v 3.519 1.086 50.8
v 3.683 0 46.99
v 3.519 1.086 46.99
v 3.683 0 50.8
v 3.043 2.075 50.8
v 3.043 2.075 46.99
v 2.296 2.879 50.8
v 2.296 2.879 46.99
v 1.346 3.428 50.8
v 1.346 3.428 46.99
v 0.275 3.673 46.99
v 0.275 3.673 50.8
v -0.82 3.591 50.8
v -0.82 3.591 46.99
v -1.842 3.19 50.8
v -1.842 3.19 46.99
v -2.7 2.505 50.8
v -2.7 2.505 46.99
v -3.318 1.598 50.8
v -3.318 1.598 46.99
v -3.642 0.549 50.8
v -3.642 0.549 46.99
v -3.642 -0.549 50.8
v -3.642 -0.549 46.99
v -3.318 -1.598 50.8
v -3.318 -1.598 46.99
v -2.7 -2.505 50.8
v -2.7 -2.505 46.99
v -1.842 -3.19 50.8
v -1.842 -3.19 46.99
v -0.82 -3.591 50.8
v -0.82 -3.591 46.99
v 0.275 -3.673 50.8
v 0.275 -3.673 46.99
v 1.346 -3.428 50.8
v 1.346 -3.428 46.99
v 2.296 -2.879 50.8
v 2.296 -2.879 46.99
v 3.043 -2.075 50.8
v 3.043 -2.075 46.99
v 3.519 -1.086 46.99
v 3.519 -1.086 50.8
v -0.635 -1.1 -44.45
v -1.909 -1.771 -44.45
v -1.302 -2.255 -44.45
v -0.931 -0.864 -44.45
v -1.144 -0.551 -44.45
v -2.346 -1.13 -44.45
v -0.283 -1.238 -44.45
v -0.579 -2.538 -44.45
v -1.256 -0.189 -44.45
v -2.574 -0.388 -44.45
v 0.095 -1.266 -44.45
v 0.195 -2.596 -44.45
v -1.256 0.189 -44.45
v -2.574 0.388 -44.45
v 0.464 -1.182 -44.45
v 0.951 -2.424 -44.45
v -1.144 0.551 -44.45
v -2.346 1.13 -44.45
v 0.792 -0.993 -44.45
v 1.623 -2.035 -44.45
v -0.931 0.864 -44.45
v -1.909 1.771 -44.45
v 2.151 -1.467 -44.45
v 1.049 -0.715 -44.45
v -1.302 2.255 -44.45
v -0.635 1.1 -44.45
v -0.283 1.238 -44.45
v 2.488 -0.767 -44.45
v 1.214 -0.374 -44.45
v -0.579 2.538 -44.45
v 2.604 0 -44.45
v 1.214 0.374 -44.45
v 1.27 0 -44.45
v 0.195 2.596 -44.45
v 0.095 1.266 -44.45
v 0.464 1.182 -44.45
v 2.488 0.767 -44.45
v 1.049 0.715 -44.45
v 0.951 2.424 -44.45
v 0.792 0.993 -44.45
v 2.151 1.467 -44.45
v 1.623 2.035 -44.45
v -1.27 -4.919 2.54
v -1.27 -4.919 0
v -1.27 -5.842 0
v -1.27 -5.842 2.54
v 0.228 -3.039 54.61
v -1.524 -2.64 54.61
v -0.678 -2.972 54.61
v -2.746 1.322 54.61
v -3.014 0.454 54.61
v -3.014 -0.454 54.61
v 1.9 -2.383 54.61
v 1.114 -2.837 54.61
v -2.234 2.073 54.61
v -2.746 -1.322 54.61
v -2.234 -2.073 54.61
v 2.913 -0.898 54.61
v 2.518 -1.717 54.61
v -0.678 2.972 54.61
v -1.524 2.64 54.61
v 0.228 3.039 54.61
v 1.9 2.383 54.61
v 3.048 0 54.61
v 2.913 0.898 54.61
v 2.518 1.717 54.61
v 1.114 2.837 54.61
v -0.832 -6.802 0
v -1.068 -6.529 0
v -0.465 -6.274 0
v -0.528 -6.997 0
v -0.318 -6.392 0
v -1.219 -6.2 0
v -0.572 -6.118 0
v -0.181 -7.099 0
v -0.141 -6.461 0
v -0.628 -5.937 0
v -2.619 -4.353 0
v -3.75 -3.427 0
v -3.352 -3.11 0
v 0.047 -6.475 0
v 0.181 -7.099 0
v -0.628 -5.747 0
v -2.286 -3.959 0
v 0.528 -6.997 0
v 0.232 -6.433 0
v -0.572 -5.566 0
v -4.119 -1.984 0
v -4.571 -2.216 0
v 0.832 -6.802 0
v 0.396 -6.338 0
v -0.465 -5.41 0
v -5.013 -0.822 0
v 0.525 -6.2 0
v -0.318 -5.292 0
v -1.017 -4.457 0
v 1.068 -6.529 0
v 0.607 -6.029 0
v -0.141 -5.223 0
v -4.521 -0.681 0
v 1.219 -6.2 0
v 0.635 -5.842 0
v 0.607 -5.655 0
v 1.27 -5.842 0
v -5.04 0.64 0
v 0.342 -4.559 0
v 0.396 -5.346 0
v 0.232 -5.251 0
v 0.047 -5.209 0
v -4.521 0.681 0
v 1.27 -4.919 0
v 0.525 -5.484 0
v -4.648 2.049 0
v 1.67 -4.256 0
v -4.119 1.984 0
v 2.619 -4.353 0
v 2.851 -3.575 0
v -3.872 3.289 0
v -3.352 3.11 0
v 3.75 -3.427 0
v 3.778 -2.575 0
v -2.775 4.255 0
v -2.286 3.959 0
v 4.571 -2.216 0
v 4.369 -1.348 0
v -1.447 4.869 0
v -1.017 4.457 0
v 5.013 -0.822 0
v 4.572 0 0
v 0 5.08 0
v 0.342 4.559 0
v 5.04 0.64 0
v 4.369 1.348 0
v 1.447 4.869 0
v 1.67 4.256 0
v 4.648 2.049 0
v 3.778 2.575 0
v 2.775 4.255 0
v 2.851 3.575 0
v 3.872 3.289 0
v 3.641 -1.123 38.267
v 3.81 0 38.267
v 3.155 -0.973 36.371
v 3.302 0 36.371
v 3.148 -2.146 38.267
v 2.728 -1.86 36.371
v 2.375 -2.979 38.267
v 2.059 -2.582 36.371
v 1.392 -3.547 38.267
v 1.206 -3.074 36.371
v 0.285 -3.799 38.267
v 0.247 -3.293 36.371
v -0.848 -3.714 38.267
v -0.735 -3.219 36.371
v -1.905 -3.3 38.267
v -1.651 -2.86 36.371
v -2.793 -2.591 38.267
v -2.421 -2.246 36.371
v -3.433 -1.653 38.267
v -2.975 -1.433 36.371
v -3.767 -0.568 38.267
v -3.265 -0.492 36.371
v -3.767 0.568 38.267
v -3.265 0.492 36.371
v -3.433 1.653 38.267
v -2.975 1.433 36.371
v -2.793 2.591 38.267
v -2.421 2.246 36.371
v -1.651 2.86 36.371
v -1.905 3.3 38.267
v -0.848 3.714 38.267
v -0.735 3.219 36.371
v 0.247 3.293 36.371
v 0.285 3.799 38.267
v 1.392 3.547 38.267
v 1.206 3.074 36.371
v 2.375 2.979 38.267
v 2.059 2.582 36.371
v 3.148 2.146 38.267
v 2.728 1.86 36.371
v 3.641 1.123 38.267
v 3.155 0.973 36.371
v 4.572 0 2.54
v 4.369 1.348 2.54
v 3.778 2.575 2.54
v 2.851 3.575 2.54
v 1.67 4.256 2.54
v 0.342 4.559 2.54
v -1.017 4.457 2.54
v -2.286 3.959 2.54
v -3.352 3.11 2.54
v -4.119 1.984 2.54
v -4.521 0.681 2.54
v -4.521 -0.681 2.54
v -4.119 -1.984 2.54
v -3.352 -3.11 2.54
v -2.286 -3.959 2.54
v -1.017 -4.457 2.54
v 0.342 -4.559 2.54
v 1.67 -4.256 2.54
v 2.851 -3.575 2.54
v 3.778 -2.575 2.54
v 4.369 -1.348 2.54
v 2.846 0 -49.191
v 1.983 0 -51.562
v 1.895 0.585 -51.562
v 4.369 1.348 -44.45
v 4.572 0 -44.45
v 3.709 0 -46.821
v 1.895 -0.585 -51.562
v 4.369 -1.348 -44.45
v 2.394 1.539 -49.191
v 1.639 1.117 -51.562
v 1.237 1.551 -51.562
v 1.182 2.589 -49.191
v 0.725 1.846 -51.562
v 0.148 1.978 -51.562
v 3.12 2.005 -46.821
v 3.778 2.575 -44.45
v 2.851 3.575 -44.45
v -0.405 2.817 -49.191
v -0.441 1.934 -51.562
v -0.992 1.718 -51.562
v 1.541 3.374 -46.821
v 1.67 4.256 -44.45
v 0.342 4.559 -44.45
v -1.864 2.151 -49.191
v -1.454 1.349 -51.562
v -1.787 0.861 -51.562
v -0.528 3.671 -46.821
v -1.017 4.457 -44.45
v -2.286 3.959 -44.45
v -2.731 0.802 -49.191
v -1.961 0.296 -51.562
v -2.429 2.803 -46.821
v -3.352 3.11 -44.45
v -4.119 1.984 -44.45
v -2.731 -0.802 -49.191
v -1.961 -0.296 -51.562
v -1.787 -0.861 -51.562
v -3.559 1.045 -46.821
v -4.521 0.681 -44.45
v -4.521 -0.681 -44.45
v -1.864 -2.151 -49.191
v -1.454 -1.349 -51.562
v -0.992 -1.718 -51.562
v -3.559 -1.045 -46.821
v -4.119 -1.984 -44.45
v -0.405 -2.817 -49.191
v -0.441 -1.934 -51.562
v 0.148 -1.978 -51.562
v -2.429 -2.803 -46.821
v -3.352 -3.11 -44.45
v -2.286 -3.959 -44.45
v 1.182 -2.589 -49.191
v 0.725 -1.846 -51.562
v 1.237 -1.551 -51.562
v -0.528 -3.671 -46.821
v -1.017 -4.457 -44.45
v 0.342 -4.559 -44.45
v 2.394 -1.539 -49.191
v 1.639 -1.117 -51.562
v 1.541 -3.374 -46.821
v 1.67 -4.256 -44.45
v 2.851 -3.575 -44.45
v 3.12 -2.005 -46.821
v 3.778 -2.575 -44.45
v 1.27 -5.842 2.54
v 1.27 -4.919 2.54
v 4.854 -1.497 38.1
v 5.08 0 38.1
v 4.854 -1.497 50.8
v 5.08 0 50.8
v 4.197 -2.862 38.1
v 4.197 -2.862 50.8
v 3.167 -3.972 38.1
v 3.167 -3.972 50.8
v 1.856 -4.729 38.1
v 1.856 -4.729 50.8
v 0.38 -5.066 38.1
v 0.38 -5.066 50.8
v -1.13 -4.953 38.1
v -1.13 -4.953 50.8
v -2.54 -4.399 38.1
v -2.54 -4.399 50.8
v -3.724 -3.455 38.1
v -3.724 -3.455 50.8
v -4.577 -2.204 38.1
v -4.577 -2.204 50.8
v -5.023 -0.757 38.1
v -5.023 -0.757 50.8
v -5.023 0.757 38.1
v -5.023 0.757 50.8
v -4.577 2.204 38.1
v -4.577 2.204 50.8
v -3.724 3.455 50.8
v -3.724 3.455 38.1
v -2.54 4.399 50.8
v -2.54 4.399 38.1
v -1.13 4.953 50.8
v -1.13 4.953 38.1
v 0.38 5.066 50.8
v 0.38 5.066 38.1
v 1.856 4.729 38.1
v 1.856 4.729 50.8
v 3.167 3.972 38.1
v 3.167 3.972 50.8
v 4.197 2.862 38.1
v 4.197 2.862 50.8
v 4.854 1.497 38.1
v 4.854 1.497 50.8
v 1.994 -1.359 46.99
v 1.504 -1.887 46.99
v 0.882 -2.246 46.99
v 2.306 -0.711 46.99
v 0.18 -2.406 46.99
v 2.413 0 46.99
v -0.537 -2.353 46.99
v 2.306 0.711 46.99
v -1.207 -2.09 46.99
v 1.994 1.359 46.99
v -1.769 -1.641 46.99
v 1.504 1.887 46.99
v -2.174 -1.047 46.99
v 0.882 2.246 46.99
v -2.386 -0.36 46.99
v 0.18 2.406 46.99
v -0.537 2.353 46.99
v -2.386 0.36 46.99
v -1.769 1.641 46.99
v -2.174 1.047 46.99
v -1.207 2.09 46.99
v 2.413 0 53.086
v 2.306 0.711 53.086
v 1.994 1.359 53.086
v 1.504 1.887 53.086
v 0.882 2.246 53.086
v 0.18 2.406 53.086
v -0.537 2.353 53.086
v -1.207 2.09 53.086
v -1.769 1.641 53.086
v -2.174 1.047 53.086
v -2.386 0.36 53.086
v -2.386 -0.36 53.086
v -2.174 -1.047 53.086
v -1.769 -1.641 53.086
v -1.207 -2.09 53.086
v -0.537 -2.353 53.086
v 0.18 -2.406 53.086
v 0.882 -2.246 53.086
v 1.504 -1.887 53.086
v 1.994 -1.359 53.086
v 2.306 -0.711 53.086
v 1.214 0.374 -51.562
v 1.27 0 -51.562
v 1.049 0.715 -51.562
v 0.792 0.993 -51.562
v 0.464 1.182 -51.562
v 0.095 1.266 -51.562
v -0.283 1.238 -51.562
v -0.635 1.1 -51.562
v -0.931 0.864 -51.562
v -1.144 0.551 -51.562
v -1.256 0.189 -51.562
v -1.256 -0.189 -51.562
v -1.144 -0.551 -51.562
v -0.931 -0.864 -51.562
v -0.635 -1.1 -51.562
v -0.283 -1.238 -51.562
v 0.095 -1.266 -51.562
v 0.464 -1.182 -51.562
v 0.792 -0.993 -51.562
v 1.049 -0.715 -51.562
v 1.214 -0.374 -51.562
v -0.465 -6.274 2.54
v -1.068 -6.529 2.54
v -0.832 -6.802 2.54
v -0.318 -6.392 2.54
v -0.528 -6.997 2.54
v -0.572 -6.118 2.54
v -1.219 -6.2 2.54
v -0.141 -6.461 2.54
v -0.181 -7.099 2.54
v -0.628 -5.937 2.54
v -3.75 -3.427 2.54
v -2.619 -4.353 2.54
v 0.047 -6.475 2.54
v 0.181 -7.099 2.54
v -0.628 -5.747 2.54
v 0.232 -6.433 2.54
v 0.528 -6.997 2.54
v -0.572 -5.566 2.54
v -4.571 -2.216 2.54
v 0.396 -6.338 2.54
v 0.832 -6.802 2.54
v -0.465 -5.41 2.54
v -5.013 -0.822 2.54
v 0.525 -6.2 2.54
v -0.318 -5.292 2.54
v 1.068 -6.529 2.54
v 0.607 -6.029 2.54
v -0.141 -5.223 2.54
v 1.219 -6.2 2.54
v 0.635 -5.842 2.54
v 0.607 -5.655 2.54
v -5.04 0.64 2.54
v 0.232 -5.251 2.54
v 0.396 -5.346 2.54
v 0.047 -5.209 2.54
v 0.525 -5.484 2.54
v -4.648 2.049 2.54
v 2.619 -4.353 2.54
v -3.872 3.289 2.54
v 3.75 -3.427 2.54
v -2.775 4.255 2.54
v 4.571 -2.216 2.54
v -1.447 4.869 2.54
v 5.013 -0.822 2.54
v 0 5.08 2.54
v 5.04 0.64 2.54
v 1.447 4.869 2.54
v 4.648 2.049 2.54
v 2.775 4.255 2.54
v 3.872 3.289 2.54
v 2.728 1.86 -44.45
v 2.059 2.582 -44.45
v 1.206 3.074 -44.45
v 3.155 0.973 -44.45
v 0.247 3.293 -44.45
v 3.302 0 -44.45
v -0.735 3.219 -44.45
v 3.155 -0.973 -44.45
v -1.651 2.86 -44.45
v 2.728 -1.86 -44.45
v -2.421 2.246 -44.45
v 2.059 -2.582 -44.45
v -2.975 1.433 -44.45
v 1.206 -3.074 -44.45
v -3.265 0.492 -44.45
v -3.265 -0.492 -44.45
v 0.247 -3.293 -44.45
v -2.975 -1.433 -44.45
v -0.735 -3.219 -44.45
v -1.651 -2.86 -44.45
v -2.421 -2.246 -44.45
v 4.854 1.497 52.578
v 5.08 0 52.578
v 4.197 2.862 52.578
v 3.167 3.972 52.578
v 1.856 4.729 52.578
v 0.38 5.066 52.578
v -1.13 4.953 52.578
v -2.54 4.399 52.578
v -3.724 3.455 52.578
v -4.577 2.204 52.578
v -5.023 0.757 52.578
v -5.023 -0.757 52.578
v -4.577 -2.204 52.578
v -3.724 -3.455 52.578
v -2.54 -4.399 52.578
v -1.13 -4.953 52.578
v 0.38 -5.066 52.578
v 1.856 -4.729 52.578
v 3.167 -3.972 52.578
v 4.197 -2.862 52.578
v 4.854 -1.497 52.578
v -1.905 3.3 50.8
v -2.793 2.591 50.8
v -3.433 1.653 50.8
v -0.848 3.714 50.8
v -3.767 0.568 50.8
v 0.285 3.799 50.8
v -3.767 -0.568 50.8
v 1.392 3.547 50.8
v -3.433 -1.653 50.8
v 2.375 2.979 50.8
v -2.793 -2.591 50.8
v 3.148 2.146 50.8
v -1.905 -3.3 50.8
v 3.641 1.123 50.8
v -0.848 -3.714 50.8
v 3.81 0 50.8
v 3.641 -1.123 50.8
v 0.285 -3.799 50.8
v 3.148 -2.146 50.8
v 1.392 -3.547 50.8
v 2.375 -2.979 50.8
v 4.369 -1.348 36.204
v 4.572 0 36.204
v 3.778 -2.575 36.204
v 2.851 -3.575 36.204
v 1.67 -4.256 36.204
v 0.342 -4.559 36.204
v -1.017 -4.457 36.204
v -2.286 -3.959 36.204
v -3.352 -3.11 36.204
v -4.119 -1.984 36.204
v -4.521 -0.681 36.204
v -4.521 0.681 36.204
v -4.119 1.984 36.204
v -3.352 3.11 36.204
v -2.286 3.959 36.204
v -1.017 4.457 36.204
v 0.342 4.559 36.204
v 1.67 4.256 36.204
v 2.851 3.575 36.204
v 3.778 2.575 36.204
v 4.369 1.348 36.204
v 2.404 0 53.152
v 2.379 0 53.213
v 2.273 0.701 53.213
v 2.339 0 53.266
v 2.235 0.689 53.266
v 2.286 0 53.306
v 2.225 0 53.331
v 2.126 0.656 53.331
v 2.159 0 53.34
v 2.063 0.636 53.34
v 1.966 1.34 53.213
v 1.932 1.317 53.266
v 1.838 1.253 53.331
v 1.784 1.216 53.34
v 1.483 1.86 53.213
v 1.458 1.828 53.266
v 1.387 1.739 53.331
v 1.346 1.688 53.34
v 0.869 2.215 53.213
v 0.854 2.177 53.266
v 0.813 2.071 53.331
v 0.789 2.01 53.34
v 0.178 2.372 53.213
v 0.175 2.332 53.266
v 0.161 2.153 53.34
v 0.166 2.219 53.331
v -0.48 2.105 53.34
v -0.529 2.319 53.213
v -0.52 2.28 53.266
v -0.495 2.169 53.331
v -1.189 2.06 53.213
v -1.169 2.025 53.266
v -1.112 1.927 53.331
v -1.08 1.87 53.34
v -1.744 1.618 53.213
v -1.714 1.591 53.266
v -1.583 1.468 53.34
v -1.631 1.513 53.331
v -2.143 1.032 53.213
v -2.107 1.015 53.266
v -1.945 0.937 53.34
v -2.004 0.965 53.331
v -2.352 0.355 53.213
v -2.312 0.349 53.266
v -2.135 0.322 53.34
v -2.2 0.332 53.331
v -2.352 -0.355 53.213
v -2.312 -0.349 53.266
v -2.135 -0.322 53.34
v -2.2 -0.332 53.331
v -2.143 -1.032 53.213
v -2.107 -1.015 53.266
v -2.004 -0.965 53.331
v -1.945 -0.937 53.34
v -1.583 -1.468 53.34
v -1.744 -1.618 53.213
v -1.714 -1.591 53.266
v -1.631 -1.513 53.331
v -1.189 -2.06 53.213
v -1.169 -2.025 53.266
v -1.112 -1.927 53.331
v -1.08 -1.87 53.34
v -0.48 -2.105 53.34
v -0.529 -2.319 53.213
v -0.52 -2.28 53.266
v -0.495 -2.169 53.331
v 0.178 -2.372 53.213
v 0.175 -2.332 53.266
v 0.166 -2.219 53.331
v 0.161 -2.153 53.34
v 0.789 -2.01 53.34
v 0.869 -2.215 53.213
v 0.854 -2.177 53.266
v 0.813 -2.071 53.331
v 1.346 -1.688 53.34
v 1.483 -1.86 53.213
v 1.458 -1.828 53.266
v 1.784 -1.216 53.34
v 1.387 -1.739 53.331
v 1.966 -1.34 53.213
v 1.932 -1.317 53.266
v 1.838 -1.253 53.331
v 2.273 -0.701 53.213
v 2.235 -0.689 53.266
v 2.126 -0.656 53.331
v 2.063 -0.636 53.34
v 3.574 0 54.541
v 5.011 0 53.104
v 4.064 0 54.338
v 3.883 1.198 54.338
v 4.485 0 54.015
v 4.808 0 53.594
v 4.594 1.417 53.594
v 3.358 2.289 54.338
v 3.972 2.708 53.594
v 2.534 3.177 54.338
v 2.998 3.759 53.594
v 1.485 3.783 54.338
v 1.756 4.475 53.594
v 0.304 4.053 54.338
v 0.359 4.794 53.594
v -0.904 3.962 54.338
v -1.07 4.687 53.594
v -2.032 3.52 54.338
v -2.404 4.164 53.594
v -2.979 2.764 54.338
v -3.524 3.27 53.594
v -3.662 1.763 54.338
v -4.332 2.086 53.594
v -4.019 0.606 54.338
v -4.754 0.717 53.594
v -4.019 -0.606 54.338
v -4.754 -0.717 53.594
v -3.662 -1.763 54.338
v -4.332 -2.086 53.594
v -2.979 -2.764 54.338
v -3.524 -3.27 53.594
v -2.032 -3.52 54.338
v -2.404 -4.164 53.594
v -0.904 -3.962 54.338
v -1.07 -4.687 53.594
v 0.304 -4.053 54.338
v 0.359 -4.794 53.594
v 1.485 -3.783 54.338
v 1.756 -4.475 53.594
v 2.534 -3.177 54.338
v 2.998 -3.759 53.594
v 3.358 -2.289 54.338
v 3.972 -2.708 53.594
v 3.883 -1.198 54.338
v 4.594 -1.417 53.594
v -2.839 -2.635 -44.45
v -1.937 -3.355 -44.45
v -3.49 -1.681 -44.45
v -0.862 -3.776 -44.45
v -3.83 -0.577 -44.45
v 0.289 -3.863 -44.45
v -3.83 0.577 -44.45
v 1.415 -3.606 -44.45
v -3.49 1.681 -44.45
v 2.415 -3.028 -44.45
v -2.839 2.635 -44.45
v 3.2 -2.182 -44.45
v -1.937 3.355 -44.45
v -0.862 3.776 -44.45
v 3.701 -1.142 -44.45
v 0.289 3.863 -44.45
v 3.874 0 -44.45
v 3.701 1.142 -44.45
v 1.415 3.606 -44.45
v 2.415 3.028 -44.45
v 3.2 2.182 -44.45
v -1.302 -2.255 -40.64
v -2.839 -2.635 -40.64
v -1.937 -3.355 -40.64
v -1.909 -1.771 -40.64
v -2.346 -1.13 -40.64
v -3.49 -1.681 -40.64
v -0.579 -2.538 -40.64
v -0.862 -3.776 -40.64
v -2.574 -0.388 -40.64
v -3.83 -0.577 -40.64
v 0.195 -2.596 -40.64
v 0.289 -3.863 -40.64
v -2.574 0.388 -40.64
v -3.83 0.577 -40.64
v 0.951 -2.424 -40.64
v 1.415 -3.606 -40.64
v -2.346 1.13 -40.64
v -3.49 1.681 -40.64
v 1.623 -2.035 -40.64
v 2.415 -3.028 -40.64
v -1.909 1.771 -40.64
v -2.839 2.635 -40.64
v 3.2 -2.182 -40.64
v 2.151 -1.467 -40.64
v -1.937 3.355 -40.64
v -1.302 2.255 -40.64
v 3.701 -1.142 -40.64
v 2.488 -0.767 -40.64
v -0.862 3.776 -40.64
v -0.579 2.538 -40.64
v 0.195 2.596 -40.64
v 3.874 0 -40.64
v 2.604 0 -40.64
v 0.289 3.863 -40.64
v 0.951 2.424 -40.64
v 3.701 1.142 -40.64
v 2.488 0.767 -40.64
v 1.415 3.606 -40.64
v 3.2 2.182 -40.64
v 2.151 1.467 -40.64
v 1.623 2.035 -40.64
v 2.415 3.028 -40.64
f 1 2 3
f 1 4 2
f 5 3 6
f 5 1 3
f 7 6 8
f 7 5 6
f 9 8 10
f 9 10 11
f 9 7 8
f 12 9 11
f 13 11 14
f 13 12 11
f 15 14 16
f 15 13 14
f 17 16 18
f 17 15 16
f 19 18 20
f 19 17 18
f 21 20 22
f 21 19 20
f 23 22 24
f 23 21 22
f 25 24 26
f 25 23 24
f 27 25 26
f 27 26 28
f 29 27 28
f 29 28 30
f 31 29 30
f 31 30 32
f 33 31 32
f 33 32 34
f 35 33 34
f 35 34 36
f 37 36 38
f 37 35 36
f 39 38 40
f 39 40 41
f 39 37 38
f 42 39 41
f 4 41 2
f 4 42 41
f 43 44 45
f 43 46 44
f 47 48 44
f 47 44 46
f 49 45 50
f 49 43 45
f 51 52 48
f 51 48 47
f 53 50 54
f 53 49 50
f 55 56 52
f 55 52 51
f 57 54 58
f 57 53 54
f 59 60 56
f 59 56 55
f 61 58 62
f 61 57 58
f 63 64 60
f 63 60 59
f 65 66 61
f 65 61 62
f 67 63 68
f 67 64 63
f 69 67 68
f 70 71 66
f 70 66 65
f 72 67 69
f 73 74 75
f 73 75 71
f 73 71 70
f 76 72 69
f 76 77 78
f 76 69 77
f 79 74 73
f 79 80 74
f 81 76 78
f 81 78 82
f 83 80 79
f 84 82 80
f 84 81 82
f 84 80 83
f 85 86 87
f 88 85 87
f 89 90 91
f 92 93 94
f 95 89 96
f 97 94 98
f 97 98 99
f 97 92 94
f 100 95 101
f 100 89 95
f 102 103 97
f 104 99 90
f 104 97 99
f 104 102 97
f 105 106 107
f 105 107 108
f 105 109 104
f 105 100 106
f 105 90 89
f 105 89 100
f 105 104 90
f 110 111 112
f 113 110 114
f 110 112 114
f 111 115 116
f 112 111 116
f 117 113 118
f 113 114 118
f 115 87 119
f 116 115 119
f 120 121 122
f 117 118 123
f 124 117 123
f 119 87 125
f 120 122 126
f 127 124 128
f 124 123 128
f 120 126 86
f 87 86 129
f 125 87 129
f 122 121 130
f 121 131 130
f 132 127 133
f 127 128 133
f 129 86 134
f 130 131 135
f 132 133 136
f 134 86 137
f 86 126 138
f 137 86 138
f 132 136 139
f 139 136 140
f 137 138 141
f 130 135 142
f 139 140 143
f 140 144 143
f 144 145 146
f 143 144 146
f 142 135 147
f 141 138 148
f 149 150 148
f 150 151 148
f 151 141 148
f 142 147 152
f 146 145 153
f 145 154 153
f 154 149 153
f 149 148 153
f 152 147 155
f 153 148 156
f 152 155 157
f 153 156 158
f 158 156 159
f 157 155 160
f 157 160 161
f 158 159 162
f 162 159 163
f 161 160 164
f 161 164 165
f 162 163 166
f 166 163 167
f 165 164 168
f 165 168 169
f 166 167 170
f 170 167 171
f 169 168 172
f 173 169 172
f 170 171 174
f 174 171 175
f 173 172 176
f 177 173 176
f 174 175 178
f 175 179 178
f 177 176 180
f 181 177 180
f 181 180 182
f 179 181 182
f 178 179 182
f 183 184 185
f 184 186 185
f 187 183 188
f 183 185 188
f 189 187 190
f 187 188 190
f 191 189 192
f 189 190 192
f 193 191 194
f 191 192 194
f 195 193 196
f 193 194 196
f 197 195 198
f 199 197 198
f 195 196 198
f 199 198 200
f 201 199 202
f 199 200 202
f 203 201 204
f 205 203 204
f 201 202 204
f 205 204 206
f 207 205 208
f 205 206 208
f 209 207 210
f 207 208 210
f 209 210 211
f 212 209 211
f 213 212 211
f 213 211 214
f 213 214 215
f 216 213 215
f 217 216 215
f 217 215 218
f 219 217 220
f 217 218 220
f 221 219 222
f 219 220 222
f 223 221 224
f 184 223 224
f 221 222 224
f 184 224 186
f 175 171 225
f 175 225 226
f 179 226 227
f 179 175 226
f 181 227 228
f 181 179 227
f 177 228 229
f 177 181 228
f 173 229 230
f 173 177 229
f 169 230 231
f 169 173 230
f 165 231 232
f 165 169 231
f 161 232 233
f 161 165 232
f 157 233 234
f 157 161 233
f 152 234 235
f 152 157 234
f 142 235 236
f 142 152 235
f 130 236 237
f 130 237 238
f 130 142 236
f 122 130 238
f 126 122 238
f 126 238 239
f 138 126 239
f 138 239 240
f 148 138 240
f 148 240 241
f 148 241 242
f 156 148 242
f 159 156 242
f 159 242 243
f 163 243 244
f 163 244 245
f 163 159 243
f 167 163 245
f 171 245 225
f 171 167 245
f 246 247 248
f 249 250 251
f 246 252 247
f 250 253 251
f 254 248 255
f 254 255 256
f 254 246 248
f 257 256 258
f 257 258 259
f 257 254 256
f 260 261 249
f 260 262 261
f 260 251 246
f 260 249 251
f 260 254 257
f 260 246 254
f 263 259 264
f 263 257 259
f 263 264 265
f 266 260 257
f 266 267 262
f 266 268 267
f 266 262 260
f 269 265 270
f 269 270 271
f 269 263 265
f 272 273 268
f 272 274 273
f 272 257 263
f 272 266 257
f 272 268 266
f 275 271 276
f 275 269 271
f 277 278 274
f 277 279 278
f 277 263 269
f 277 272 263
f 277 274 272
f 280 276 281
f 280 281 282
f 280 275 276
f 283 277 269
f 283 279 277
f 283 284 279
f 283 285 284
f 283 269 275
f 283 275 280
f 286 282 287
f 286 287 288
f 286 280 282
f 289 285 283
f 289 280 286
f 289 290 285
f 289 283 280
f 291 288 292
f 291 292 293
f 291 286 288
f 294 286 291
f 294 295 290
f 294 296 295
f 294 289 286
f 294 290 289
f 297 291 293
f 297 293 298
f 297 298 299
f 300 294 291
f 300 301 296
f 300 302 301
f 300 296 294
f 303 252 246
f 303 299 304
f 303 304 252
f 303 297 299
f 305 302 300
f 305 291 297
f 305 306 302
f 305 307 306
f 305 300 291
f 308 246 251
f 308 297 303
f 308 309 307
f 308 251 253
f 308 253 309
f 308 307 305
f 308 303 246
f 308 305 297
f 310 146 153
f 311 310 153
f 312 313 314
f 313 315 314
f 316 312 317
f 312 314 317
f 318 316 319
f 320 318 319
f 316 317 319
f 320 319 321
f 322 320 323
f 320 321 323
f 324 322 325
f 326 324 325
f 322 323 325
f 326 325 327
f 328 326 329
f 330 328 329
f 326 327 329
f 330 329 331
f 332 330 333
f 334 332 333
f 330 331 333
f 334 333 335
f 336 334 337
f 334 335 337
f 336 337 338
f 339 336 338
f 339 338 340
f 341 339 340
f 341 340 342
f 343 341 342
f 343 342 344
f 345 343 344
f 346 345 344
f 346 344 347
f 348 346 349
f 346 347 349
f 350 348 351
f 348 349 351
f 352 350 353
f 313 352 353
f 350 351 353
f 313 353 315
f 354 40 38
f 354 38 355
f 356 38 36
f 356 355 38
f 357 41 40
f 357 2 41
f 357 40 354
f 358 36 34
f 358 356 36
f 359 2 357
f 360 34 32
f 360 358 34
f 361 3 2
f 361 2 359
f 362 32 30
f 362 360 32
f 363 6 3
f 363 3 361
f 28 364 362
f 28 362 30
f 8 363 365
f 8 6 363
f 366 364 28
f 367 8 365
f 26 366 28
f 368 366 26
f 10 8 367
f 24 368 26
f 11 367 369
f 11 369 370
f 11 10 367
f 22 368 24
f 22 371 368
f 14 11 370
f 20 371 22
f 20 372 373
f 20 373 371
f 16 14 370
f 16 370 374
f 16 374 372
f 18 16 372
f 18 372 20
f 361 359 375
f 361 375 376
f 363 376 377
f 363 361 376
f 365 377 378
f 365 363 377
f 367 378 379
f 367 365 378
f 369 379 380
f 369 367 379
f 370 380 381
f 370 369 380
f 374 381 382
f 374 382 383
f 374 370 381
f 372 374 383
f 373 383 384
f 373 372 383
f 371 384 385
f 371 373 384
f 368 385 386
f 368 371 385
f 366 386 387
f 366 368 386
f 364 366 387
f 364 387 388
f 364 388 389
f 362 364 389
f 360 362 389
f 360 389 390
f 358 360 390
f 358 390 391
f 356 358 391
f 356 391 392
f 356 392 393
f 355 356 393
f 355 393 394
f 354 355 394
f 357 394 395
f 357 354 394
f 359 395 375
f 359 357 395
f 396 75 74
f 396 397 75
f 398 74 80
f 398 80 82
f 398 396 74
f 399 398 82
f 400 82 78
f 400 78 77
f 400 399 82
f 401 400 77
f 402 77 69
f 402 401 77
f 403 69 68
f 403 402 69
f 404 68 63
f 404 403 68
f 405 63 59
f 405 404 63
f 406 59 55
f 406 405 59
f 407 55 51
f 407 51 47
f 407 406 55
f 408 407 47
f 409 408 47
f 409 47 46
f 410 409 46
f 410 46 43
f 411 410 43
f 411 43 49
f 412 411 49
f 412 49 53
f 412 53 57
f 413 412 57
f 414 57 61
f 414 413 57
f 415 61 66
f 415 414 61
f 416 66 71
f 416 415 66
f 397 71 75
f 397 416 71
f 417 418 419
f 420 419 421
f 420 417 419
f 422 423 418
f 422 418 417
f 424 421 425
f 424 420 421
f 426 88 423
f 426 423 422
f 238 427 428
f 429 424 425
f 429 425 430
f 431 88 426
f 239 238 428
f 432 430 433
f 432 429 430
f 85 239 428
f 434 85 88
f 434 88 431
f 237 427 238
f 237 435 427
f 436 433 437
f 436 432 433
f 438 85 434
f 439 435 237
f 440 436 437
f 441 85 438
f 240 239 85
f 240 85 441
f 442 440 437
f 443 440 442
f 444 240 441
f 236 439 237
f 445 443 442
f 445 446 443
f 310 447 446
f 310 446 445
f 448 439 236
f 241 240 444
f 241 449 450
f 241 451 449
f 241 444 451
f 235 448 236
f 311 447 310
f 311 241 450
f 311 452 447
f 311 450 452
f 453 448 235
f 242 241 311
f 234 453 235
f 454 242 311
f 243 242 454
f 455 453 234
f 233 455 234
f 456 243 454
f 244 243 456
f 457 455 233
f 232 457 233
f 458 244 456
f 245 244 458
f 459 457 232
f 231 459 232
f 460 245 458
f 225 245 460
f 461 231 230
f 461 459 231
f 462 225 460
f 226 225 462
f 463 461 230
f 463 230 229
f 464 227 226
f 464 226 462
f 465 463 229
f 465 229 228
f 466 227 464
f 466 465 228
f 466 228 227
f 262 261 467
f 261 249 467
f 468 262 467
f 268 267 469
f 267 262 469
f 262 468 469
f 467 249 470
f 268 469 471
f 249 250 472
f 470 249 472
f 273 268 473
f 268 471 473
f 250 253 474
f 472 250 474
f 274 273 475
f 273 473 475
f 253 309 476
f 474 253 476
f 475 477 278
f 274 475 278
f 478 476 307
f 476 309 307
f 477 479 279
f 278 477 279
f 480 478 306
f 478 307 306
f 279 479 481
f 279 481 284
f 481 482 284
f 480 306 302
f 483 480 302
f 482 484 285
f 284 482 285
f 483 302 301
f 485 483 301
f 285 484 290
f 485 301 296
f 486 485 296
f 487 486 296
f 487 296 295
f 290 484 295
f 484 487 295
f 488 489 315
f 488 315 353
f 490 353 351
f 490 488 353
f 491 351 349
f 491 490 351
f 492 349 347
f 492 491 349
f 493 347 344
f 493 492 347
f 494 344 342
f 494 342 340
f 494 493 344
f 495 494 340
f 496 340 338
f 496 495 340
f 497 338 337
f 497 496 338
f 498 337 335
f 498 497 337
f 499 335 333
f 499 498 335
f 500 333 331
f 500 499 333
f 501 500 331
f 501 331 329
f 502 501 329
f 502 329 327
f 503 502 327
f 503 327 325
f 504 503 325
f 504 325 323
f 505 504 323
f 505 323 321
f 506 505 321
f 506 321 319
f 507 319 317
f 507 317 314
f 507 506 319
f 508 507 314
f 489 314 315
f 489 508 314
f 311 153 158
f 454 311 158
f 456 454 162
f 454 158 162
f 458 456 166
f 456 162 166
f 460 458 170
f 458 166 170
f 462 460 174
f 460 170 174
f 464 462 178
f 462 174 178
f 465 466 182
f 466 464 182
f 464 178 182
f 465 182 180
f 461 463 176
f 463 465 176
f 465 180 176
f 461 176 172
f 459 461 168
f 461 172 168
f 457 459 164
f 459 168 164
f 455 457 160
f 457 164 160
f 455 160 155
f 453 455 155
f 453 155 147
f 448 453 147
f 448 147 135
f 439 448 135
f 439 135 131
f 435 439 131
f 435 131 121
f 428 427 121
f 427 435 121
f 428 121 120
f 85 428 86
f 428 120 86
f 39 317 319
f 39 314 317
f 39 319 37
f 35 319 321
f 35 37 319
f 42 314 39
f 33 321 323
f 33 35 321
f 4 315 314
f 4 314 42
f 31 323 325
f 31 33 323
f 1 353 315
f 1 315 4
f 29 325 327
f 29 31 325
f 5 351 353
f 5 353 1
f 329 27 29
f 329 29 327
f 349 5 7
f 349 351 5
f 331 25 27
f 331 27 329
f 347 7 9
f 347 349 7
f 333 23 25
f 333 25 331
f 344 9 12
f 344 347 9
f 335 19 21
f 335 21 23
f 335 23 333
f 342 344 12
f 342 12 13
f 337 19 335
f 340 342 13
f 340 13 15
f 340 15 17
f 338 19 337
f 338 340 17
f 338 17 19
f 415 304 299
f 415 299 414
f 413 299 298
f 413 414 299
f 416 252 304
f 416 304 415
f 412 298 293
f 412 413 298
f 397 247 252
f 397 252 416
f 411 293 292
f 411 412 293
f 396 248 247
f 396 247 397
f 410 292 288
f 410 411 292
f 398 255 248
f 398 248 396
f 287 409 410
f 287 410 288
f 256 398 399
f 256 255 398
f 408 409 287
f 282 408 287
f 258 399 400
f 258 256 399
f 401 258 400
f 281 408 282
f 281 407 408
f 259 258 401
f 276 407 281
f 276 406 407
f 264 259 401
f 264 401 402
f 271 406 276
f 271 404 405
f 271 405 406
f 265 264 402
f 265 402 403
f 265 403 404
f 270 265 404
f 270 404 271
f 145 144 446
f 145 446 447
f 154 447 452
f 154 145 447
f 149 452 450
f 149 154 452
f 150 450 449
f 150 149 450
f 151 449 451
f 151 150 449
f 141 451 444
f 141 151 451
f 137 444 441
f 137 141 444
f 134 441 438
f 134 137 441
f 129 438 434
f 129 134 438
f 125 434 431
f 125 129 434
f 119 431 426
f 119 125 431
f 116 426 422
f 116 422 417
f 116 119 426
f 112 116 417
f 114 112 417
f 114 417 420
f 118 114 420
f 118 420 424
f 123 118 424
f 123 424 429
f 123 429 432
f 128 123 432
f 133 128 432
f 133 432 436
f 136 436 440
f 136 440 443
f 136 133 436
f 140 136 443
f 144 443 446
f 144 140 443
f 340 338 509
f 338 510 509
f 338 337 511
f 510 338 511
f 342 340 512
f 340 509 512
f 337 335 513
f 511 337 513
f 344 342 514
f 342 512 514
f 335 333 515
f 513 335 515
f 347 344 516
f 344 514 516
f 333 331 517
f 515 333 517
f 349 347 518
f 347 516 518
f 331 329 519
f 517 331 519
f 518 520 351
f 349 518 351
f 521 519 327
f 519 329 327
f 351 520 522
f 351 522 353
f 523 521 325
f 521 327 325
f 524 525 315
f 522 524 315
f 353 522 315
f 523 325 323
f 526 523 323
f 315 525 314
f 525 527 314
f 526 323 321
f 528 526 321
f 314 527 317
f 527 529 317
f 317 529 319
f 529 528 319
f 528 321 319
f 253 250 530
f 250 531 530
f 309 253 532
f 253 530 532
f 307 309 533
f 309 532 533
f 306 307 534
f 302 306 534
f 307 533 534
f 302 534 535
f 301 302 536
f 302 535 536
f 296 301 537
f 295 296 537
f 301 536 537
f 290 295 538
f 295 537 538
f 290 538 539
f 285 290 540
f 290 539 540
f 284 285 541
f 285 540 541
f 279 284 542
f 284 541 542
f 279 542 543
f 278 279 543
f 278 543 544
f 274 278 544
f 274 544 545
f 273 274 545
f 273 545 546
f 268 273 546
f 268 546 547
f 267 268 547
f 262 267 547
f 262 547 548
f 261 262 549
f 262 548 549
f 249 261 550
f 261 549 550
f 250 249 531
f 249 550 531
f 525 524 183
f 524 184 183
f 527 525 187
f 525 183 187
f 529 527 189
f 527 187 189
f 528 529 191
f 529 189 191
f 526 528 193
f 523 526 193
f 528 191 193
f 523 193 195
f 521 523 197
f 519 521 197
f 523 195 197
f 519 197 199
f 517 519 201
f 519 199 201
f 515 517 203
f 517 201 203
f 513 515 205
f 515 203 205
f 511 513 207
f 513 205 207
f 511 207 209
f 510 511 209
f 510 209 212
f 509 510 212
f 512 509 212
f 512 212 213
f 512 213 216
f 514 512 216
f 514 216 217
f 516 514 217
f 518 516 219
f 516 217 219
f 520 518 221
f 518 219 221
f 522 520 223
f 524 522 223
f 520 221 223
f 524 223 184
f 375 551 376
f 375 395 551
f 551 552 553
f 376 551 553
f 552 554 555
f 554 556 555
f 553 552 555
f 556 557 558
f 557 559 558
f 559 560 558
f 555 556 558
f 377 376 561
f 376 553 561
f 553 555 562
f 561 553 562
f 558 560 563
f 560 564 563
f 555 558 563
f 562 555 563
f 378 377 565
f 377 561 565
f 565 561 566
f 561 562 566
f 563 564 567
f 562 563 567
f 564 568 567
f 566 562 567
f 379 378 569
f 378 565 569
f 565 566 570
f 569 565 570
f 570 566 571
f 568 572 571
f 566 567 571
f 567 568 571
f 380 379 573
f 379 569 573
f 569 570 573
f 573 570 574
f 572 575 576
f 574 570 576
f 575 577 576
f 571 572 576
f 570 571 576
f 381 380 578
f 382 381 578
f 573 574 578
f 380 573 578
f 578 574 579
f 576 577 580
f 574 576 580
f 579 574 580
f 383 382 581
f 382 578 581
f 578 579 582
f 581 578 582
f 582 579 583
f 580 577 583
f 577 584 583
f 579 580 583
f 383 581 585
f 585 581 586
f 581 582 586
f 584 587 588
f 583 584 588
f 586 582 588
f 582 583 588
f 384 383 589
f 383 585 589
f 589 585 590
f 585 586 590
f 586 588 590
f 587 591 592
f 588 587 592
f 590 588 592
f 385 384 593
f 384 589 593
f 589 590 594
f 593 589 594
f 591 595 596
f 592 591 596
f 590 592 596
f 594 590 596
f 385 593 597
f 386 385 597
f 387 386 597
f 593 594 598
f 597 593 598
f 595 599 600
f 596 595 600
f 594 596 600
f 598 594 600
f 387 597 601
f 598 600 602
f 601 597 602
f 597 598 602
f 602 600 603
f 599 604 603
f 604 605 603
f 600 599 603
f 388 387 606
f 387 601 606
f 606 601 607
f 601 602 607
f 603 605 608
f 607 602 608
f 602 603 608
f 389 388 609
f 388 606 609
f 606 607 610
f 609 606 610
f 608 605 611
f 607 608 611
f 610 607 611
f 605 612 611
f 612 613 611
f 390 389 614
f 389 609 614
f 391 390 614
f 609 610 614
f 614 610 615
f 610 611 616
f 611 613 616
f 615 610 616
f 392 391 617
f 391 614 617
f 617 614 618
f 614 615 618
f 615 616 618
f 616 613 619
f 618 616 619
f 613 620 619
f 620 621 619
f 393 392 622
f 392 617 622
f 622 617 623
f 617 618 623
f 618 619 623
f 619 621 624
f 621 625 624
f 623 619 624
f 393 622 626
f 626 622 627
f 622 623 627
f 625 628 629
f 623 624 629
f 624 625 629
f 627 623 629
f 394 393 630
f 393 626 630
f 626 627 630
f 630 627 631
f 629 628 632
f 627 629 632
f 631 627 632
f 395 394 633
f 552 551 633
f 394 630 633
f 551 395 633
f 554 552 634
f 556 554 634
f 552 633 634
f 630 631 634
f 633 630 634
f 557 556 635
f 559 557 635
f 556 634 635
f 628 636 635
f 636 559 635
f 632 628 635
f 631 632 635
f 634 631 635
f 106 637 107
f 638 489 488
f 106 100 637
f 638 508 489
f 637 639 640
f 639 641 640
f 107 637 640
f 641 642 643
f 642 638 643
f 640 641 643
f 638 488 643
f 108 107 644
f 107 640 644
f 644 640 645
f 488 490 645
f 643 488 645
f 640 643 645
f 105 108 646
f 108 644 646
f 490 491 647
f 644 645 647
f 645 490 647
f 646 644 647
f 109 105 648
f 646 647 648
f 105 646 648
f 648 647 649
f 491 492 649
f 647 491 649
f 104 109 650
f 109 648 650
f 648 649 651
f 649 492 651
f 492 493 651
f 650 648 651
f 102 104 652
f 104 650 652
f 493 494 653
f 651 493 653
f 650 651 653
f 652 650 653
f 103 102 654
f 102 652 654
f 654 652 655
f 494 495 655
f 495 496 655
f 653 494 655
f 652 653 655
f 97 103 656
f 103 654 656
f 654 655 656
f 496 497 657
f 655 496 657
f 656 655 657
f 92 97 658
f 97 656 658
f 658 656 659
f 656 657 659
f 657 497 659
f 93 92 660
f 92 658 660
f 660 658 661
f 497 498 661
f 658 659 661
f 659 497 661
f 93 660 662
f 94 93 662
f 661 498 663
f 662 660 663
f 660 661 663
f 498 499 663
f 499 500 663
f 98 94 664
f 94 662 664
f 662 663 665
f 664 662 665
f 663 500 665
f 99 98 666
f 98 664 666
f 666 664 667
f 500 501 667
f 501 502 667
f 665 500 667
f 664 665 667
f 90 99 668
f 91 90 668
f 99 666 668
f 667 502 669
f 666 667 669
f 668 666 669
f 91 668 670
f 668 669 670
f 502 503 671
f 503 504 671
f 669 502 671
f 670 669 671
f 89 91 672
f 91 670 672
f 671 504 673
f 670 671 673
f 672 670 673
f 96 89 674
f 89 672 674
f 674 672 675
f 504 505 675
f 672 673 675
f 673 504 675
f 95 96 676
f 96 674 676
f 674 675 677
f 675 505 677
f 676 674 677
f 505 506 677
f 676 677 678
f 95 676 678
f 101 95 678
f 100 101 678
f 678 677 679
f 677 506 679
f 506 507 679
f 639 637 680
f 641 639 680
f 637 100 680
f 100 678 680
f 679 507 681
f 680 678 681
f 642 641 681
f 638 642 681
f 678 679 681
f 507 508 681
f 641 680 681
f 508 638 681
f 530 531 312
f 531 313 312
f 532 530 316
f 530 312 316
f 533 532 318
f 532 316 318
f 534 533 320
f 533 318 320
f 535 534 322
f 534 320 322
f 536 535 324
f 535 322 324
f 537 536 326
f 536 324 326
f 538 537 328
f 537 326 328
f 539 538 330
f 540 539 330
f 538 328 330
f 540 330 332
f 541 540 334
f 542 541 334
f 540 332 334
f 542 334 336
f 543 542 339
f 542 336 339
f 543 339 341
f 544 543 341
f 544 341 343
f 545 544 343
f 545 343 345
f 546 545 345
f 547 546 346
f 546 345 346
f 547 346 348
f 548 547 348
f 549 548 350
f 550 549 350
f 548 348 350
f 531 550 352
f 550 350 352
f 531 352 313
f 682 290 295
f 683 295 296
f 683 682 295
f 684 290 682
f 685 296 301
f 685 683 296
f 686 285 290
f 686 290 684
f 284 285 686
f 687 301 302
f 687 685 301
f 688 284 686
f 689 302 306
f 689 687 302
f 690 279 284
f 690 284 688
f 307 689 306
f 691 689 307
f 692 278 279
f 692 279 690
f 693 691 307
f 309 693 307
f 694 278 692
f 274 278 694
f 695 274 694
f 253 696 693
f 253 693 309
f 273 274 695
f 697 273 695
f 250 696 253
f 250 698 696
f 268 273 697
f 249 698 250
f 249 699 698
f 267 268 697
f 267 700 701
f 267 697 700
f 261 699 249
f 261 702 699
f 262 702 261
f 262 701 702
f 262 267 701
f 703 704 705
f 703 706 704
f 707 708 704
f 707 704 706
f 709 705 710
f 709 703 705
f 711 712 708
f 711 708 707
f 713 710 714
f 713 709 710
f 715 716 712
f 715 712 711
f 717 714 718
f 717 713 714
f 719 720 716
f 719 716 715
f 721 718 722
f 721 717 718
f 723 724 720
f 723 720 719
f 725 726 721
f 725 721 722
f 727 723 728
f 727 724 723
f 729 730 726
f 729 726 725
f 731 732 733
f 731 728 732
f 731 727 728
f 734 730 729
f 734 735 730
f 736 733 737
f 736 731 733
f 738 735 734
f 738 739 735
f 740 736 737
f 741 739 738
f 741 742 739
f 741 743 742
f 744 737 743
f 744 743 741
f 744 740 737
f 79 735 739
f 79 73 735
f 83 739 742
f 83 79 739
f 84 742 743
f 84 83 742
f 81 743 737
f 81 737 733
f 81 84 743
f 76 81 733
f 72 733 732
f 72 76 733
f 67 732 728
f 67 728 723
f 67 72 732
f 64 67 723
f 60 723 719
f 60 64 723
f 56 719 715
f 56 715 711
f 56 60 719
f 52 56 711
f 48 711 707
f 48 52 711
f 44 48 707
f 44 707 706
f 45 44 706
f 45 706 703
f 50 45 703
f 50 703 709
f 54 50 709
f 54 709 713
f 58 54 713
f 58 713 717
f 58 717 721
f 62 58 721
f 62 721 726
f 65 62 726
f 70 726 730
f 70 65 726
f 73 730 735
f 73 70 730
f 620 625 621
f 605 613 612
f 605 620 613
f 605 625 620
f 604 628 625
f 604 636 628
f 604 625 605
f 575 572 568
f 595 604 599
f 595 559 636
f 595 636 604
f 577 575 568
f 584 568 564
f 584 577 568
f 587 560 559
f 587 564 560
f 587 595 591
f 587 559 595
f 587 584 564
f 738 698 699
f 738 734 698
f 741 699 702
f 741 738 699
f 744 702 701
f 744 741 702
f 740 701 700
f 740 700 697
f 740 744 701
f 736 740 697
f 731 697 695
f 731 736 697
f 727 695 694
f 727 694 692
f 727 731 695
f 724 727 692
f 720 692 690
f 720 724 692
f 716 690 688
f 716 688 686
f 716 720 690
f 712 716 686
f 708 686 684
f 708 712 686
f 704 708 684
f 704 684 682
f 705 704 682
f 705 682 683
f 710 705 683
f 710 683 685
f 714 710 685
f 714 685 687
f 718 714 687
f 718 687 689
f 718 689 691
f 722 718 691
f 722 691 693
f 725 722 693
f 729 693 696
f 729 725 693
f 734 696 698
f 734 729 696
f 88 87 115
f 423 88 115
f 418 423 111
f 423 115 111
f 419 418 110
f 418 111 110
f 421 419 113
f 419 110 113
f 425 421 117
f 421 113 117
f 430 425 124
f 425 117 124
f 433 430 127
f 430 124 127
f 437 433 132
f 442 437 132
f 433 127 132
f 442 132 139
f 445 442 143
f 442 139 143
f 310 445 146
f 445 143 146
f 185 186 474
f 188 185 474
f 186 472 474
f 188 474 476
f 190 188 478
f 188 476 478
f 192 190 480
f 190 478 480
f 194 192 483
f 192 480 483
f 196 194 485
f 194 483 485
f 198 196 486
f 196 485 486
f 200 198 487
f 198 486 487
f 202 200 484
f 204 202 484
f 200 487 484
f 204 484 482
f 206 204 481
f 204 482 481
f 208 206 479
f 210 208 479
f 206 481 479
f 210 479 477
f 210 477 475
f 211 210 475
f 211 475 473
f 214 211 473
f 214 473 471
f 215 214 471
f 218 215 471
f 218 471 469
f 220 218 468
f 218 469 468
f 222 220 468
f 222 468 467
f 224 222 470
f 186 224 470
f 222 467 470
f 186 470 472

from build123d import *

# Parameters (mm, degrees)
F4_R      = 2.032
F5_R      = 0.254
F8_R      = 5.08
F8_R_2    = 4.572
F9_DEPTH  = 2.54
F10_R     = 0.635
F11_DEPTH = 2.54


with BuildPart() as f1:
    # F0 (on Front) → F1 (revolve)
    with BuildSketch(Plane.XZ):
        Polygon((5.08, 38.1), (5.08, 50.8), (3.81, 50.8), (3.81, 38.267199), (3.302, 36.371317), (3.302, -44.45), (4.572, -44.45), (4.572, 36.204118), align=None)
    revolve(axis=Axis((0, 0, 3.175), (0, 0, -1)))


with BuildPart() as f3:
    # F2 (on Front) → F3 (revolve)
    with BuildSketch(Plane.XZ):
        Polygon((5.08, 54.61), (0, 54.61), (0, 53.34), (2.413, 53.34), (2.413, 46.99), (3.683, 46.99), (3.683, 50.8), (5.08, 50.8), align=None)
    revolve(axis=Axis((0, 0, 26.873097), (0, 0, 1)))

    # F4
    f4_edges = [f3.edges().sort_by_distance(p)[0] for p in [
        (-5.08, 0, 54.61),
    ]]
    fillet(f4_edges, radius=F4_R)

    # F5
    f5_edges = [f3.edges().sort_by_distance(p)[0] for p in [
        (-2.413, 0, 53.34),
    ]]
    fillet(f5_edges, radius=F5_R)


with BuildPart() as f7:
    # F6 (on Front) → F7 (revolve)
    with BuildSketch(Plane.XZ):
        Polygon((3.8735, -44.45), (3.8735, -40.64), (2.6035, -40.64), (2.6035, -44.45), (1.27, -44.45), (1.27, -51.562), (1.983444, -51.562), (4.572, -44.45), align=None)
    revolve(axis=Axis((0, 0, -57.989374), (0, 0, 1)))


with BuildPart() as f9:
    # F8 (on Top) → F9 (new body)
    with BuildSketch(Plane.XY):
        Circle(F8_R)
        Circle(F8_R_2, mode=Mode.SUBTRACT)
    extrude(amount=F9_DEPTH)

    # F10 (on Top) → F11 (join, through all)
    with BuildSketch(Plane.XY):
        with BuildLine():
            Line((-1.27, -4.918689), (-1.27, -5.842))
            ThreePointArc((-1.27, -5.842), (0, -7.112), (1.27, -5.842))
            Line((1.27, -5.842), (1.27, -4.918689))
            ThreePointArc((1.27, -4.918689), (0, -5.08), (-1.27, -4.918689))
        make_face()
        with Locations((0, -5.842)):
            Circle(F10_R, mode=Mode.SUBTRACT)
    extrude(amount=F11_DEPTH)


solid = Compound([f1.part, f3.part, f7.part, f9.part])
